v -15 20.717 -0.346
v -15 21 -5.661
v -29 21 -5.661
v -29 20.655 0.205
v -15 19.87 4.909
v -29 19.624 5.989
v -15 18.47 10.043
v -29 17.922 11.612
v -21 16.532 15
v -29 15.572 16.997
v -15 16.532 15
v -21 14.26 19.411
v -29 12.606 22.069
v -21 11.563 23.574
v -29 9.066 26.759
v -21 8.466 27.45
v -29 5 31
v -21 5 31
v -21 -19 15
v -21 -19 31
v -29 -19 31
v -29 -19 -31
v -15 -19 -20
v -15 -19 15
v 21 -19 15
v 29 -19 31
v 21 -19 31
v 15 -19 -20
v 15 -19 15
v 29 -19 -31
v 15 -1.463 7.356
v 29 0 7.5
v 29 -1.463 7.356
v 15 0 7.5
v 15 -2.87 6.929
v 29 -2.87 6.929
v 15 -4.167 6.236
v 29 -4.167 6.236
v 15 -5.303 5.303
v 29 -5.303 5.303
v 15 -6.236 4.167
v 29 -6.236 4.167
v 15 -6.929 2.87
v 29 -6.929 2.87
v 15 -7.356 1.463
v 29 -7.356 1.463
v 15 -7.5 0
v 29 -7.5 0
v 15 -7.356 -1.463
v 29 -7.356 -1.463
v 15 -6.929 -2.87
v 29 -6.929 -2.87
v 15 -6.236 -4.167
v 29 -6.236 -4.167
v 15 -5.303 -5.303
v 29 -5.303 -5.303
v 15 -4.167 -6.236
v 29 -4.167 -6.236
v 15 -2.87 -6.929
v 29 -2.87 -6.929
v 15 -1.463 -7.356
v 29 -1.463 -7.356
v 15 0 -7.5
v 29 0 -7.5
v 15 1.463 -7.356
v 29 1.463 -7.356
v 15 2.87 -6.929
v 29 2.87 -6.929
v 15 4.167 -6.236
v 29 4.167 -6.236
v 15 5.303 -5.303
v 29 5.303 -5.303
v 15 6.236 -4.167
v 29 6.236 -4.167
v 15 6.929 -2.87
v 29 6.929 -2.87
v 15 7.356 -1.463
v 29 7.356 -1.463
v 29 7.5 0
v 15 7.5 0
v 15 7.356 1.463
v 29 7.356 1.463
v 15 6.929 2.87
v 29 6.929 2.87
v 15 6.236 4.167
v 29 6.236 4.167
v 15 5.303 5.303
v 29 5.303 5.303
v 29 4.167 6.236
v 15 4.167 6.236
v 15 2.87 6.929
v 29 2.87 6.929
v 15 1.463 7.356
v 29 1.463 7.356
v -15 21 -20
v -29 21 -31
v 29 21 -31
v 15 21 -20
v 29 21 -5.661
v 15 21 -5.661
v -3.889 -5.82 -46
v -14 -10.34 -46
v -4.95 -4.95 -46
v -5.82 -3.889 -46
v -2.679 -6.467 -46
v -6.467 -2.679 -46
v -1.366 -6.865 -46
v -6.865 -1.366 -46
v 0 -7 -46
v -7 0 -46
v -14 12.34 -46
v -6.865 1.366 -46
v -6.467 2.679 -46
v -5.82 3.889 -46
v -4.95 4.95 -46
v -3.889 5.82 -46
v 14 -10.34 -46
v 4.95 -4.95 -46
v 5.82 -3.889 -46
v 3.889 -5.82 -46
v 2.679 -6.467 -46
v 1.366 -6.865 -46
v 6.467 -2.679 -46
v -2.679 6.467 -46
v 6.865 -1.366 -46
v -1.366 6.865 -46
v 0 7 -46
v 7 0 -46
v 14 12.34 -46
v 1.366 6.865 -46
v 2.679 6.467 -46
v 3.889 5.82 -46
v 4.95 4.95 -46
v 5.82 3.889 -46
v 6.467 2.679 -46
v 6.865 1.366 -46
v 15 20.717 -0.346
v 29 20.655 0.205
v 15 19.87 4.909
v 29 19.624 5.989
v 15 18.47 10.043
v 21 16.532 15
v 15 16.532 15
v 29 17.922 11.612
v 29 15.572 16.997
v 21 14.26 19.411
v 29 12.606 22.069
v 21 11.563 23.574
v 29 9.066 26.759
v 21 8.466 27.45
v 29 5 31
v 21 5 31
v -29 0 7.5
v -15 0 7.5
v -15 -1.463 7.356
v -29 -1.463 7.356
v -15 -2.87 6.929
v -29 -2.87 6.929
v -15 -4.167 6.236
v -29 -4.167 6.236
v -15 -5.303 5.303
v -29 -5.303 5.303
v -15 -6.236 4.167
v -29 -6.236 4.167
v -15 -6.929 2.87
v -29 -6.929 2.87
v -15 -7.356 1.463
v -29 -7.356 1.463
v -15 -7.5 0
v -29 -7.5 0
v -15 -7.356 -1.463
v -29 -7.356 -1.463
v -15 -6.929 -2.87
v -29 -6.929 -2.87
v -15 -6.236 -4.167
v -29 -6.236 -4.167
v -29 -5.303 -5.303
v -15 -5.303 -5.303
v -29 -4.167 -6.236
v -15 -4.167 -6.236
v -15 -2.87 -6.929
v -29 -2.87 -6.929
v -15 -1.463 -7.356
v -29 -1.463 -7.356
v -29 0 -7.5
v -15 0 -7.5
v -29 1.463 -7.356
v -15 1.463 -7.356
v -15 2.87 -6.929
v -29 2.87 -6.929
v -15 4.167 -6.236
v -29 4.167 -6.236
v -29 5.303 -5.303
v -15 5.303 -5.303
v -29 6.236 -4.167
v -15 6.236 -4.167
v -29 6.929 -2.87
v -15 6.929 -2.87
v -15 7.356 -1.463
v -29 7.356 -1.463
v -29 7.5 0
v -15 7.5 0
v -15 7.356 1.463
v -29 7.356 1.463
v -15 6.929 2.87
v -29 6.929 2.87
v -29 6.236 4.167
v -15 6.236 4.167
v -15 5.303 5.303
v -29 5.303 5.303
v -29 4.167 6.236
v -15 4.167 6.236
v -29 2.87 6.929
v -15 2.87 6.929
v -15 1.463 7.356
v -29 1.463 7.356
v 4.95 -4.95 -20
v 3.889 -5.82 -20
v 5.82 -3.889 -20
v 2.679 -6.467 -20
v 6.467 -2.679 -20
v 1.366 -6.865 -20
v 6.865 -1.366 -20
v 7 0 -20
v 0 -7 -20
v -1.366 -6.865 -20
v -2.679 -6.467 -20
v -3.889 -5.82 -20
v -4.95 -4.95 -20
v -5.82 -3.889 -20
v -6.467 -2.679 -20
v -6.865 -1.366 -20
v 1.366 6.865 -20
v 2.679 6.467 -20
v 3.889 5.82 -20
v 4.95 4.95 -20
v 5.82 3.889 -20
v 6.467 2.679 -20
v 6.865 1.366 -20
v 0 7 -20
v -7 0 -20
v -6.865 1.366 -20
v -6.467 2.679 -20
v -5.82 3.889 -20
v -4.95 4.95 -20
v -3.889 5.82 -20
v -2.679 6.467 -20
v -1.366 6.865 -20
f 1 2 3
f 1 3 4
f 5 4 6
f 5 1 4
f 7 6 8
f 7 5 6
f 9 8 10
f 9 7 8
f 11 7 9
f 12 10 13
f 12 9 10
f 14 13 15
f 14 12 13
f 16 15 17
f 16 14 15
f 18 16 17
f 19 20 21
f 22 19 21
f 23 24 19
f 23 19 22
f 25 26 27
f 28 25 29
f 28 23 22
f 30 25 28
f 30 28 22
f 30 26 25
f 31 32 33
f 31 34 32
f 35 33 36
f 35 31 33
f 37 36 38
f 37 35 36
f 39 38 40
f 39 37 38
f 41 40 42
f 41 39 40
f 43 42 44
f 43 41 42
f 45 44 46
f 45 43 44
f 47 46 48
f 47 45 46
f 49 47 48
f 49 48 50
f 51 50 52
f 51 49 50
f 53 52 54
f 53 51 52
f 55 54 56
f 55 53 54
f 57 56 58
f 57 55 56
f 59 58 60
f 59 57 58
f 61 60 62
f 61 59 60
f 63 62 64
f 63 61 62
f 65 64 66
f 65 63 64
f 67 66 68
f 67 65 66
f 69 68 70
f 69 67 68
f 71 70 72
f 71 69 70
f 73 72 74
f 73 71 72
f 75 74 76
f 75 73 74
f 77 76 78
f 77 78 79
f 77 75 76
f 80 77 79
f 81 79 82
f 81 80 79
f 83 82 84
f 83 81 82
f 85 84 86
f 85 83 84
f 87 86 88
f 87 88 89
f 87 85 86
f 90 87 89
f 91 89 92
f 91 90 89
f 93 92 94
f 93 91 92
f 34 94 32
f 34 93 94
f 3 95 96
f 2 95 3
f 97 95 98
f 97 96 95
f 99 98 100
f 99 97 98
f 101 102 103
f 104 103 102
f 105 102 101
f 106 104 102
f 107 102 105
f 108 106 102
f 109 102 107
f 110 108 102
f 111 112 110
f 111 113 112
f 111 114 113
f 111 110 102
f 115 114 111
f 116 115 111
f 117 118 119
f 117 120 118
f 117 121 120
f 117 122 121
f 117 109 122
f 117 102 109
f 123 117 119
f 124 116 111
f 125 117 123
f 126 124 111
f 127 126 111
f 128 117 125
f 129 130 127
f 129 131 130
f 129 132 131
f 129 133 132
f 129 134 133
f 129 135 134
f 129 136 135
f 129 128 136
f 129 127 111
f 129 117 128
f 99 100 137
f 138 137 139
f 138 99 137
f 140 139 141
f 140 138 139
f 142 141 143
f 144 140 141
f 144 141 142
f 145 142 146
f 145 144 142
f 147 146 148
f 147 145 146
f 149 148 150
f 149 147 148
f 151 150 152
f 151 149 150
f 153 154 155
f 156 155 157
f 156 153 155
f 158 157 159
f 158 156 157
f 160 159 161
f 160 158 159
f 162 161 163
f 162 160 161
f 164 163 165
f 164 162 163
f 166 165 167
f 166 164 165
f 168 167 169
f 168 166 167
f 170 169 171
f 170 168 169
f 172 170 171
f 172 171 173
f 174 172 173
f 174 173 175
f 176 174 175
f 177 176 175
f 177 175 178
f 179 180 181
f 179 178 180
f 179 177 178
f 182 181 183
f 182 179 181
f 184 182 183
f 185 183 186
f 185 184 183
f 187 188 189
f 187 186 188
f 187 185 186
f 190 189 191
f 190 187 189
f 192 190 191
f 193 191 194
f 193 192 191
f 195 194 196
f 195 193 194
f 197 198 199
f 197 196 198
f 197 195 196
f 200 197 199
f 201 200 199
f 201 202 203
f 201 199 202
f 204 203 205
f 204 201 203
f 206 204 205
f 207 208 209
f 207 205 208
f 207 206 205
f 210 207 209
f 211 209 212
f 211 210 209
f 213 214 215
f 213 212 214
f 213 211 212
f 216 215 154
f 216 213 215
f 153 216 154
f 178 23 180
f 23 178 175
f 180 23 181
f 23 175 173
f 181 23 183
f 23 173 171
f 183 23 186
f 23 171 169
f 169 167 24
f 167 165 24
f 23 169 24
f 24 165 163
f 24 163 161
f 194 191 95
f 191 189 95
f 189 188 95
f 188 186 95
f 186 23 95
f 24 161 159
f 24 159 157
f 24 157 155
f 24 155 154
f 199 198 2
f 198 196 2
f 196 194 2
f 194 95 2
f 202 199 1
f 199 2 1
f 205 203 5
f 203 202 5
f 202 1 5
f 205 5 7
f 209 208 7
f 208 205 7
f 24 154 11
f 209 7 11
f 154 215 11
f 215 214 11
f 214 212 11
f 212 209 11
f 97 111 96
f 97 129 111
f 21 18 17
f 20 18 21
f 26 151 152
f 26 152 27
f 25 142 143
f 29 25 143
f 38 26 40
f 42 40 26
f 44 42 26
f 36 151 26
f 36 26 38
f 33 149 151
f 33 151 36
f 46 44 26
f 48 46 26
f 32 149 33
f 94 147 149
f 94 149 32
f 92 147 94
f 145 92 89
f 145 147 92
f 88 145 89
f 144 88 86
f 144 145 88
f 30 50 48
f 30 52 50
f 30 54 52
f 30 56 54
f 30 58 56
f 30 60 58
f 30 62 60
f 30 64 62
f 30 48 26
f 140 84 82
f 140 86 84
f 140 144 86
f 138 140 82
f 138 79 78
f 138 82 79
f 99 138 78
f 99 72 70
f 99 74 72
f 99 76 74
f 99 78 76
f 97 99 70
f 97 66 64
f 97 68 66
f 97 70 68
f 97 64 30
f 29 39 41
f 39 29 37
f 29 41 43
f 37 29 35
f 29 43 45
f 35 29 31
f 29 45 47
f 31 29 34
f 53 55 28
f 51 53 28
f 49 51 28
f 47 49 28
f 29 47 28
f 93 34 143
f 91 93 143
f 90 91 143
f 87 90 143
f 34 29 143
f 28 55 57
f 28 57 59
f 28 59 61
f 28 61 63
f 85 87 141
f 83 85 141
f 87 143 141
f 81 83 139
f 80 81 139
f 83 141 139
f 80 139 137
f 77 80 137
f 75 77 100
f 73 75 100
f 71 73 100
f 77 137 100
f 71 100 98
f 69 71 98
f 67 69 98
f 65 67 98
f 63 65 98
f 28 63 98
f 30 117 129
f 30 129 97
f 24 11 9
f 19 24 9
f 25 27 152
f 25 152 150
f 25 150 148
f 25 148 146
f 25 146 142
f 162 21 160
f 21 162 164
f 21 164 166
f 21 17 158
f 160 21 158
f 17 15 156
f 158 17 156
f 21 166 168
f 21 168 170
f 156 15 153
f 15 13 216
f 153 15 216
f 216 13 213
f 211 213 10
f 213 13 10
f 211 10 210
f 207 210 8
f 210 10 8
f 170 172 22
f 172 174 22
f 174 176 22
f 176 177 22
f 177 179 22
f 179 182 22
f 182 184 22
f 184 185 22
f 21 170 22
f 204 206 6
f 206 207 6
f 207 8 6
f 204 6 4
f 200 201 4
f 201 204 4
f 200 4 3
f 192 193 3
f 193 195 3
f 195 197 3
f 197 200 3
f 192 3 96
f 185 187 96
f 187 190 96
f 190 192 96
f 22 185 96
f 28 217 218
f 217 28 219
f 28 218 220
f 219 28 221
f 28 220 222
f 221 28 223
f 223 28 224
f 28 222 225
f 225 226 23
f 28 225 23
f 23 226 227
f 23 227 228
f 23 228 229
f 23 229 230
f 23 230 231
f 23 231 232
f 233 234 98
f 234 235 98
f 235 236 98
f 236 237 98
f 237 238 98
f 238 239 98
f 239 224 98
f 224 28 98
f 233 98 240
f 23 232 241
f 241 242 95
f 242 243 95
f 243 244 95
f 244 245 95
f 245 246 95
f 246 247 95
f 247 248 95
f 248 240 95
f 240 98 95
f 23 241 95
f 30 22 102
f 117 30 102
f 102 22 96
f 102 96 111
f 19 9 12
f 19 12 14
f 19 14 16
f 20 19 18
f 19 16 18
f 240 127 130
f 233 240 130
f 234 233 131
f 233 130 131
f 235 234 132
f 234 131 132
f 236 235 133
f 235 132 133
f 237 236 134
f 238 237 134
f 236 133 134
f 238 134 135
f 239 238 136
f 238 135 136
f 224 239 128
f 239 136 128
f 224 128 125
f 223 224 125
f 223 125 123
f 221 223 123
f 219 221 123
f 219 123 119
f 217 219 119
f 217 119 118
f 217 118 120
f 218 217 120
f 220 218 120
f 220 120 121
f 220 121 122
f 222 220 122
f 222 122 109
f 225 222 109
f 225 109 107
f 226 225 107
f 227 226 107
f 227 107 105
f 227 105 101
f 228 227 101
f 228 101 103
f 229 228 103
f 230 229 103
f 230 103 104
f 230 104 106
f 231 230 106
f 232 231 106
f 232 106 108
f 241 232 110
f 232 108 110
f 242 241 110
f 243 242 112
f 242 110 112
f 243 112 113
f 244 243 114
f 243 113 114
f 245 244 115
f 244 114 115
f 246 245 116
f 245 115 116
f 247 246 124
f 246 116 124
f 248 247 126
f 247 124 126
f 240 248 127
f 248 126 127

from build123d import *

# Parameters (mm, degrees)
SKETCH1_R           = 7.5
BOSS_EXTRUDE1_DEPTH = 29
CUT_EXTRUDE1_DEPTH  = 68.505555327
SKETCH3_R           = 7
CUT_EXTRUDE2_DEPTH  = 85.917607126
CUT_EXTRUDE3_DEPTH  = 68.505555438


with BuildPart() as part:
    # Sketch1 → Boss-Extrude1 (new, symmetric)
    with BuildSketch(Plane(origin=(0, 0, 0), x_dir=(0, 0, -1), z_dir=(1, 0, 0))):
        with BuildLine():
            Line((-31, 5), (-31, -19))
            Line((-31, -19), (31, -19))
            Line((31, -19), (46, -10.339745962))
            Line((46, -10.339745962), (46, 12.339745962))
            Line((46, 12.339745962), (31, 21))
            Line((31, 21), (5.66060556, 21))
            ThreePointArc((5.66060556, 21), (-14.33939444, 16.82575695), (-31, 5))
        make_face()
        with Locations(Location((0, 0, 0), (0, 0, 180))):
            Circle(SKETCH1_R, mode=Mode.SUBTRACT)
    extrude(amount=BOSS_EXTRUDE1_DEPTH, both=True)

    # Sketch2 → Cut-Extrude1 (cut, through all)
    with BuildSketch(Plane(origin=(0, 21, 0), x_dir=(1, 0, 0), z_dir=(0, 1, 0))):
        Polygon((-29, 31), (-14, 46), (-29, 46), align=None)
        Polygon((29, 31), (29, 46), (14, 46), align=None)
    extrude(amount=-CUT_EXTRUDE1_DEPTH, mode=Mode.SUBTRACT)

    # Sketch3 → Cut-Extrude2 (cut, through all)
    with BuildSketch(Plane(origin=(0, 0, -46), x_dir=(-1, 0, 0), z_dir=(0, 0, -1))):
        with Locations(Location((0, 0, 0), (0, 0, 90))):
            Circle(SKETCH3_R)
    extrude(amount=-CUT_EXTRUDE2_DEPTH, mode=Mode.SUBTRACT)

    # Sketch4 → Cut-Extrude3 (cut, through all)
    with BuildSketch(Plane(origin=(0, 21, 0), x_dir=(1, 0, 0), z_dir=(0, 1, 0))):
        Polygon((-21, -31), (21, -31), (21, -15), (15, -15), (15, 20), (-15, 20), (-15, -15), (-21, -15), align=None)
    extrude(amount=-CUT_EXTRUDE3_DEPTH, mode=Mode.SUBTRACT)


solid = part.part
